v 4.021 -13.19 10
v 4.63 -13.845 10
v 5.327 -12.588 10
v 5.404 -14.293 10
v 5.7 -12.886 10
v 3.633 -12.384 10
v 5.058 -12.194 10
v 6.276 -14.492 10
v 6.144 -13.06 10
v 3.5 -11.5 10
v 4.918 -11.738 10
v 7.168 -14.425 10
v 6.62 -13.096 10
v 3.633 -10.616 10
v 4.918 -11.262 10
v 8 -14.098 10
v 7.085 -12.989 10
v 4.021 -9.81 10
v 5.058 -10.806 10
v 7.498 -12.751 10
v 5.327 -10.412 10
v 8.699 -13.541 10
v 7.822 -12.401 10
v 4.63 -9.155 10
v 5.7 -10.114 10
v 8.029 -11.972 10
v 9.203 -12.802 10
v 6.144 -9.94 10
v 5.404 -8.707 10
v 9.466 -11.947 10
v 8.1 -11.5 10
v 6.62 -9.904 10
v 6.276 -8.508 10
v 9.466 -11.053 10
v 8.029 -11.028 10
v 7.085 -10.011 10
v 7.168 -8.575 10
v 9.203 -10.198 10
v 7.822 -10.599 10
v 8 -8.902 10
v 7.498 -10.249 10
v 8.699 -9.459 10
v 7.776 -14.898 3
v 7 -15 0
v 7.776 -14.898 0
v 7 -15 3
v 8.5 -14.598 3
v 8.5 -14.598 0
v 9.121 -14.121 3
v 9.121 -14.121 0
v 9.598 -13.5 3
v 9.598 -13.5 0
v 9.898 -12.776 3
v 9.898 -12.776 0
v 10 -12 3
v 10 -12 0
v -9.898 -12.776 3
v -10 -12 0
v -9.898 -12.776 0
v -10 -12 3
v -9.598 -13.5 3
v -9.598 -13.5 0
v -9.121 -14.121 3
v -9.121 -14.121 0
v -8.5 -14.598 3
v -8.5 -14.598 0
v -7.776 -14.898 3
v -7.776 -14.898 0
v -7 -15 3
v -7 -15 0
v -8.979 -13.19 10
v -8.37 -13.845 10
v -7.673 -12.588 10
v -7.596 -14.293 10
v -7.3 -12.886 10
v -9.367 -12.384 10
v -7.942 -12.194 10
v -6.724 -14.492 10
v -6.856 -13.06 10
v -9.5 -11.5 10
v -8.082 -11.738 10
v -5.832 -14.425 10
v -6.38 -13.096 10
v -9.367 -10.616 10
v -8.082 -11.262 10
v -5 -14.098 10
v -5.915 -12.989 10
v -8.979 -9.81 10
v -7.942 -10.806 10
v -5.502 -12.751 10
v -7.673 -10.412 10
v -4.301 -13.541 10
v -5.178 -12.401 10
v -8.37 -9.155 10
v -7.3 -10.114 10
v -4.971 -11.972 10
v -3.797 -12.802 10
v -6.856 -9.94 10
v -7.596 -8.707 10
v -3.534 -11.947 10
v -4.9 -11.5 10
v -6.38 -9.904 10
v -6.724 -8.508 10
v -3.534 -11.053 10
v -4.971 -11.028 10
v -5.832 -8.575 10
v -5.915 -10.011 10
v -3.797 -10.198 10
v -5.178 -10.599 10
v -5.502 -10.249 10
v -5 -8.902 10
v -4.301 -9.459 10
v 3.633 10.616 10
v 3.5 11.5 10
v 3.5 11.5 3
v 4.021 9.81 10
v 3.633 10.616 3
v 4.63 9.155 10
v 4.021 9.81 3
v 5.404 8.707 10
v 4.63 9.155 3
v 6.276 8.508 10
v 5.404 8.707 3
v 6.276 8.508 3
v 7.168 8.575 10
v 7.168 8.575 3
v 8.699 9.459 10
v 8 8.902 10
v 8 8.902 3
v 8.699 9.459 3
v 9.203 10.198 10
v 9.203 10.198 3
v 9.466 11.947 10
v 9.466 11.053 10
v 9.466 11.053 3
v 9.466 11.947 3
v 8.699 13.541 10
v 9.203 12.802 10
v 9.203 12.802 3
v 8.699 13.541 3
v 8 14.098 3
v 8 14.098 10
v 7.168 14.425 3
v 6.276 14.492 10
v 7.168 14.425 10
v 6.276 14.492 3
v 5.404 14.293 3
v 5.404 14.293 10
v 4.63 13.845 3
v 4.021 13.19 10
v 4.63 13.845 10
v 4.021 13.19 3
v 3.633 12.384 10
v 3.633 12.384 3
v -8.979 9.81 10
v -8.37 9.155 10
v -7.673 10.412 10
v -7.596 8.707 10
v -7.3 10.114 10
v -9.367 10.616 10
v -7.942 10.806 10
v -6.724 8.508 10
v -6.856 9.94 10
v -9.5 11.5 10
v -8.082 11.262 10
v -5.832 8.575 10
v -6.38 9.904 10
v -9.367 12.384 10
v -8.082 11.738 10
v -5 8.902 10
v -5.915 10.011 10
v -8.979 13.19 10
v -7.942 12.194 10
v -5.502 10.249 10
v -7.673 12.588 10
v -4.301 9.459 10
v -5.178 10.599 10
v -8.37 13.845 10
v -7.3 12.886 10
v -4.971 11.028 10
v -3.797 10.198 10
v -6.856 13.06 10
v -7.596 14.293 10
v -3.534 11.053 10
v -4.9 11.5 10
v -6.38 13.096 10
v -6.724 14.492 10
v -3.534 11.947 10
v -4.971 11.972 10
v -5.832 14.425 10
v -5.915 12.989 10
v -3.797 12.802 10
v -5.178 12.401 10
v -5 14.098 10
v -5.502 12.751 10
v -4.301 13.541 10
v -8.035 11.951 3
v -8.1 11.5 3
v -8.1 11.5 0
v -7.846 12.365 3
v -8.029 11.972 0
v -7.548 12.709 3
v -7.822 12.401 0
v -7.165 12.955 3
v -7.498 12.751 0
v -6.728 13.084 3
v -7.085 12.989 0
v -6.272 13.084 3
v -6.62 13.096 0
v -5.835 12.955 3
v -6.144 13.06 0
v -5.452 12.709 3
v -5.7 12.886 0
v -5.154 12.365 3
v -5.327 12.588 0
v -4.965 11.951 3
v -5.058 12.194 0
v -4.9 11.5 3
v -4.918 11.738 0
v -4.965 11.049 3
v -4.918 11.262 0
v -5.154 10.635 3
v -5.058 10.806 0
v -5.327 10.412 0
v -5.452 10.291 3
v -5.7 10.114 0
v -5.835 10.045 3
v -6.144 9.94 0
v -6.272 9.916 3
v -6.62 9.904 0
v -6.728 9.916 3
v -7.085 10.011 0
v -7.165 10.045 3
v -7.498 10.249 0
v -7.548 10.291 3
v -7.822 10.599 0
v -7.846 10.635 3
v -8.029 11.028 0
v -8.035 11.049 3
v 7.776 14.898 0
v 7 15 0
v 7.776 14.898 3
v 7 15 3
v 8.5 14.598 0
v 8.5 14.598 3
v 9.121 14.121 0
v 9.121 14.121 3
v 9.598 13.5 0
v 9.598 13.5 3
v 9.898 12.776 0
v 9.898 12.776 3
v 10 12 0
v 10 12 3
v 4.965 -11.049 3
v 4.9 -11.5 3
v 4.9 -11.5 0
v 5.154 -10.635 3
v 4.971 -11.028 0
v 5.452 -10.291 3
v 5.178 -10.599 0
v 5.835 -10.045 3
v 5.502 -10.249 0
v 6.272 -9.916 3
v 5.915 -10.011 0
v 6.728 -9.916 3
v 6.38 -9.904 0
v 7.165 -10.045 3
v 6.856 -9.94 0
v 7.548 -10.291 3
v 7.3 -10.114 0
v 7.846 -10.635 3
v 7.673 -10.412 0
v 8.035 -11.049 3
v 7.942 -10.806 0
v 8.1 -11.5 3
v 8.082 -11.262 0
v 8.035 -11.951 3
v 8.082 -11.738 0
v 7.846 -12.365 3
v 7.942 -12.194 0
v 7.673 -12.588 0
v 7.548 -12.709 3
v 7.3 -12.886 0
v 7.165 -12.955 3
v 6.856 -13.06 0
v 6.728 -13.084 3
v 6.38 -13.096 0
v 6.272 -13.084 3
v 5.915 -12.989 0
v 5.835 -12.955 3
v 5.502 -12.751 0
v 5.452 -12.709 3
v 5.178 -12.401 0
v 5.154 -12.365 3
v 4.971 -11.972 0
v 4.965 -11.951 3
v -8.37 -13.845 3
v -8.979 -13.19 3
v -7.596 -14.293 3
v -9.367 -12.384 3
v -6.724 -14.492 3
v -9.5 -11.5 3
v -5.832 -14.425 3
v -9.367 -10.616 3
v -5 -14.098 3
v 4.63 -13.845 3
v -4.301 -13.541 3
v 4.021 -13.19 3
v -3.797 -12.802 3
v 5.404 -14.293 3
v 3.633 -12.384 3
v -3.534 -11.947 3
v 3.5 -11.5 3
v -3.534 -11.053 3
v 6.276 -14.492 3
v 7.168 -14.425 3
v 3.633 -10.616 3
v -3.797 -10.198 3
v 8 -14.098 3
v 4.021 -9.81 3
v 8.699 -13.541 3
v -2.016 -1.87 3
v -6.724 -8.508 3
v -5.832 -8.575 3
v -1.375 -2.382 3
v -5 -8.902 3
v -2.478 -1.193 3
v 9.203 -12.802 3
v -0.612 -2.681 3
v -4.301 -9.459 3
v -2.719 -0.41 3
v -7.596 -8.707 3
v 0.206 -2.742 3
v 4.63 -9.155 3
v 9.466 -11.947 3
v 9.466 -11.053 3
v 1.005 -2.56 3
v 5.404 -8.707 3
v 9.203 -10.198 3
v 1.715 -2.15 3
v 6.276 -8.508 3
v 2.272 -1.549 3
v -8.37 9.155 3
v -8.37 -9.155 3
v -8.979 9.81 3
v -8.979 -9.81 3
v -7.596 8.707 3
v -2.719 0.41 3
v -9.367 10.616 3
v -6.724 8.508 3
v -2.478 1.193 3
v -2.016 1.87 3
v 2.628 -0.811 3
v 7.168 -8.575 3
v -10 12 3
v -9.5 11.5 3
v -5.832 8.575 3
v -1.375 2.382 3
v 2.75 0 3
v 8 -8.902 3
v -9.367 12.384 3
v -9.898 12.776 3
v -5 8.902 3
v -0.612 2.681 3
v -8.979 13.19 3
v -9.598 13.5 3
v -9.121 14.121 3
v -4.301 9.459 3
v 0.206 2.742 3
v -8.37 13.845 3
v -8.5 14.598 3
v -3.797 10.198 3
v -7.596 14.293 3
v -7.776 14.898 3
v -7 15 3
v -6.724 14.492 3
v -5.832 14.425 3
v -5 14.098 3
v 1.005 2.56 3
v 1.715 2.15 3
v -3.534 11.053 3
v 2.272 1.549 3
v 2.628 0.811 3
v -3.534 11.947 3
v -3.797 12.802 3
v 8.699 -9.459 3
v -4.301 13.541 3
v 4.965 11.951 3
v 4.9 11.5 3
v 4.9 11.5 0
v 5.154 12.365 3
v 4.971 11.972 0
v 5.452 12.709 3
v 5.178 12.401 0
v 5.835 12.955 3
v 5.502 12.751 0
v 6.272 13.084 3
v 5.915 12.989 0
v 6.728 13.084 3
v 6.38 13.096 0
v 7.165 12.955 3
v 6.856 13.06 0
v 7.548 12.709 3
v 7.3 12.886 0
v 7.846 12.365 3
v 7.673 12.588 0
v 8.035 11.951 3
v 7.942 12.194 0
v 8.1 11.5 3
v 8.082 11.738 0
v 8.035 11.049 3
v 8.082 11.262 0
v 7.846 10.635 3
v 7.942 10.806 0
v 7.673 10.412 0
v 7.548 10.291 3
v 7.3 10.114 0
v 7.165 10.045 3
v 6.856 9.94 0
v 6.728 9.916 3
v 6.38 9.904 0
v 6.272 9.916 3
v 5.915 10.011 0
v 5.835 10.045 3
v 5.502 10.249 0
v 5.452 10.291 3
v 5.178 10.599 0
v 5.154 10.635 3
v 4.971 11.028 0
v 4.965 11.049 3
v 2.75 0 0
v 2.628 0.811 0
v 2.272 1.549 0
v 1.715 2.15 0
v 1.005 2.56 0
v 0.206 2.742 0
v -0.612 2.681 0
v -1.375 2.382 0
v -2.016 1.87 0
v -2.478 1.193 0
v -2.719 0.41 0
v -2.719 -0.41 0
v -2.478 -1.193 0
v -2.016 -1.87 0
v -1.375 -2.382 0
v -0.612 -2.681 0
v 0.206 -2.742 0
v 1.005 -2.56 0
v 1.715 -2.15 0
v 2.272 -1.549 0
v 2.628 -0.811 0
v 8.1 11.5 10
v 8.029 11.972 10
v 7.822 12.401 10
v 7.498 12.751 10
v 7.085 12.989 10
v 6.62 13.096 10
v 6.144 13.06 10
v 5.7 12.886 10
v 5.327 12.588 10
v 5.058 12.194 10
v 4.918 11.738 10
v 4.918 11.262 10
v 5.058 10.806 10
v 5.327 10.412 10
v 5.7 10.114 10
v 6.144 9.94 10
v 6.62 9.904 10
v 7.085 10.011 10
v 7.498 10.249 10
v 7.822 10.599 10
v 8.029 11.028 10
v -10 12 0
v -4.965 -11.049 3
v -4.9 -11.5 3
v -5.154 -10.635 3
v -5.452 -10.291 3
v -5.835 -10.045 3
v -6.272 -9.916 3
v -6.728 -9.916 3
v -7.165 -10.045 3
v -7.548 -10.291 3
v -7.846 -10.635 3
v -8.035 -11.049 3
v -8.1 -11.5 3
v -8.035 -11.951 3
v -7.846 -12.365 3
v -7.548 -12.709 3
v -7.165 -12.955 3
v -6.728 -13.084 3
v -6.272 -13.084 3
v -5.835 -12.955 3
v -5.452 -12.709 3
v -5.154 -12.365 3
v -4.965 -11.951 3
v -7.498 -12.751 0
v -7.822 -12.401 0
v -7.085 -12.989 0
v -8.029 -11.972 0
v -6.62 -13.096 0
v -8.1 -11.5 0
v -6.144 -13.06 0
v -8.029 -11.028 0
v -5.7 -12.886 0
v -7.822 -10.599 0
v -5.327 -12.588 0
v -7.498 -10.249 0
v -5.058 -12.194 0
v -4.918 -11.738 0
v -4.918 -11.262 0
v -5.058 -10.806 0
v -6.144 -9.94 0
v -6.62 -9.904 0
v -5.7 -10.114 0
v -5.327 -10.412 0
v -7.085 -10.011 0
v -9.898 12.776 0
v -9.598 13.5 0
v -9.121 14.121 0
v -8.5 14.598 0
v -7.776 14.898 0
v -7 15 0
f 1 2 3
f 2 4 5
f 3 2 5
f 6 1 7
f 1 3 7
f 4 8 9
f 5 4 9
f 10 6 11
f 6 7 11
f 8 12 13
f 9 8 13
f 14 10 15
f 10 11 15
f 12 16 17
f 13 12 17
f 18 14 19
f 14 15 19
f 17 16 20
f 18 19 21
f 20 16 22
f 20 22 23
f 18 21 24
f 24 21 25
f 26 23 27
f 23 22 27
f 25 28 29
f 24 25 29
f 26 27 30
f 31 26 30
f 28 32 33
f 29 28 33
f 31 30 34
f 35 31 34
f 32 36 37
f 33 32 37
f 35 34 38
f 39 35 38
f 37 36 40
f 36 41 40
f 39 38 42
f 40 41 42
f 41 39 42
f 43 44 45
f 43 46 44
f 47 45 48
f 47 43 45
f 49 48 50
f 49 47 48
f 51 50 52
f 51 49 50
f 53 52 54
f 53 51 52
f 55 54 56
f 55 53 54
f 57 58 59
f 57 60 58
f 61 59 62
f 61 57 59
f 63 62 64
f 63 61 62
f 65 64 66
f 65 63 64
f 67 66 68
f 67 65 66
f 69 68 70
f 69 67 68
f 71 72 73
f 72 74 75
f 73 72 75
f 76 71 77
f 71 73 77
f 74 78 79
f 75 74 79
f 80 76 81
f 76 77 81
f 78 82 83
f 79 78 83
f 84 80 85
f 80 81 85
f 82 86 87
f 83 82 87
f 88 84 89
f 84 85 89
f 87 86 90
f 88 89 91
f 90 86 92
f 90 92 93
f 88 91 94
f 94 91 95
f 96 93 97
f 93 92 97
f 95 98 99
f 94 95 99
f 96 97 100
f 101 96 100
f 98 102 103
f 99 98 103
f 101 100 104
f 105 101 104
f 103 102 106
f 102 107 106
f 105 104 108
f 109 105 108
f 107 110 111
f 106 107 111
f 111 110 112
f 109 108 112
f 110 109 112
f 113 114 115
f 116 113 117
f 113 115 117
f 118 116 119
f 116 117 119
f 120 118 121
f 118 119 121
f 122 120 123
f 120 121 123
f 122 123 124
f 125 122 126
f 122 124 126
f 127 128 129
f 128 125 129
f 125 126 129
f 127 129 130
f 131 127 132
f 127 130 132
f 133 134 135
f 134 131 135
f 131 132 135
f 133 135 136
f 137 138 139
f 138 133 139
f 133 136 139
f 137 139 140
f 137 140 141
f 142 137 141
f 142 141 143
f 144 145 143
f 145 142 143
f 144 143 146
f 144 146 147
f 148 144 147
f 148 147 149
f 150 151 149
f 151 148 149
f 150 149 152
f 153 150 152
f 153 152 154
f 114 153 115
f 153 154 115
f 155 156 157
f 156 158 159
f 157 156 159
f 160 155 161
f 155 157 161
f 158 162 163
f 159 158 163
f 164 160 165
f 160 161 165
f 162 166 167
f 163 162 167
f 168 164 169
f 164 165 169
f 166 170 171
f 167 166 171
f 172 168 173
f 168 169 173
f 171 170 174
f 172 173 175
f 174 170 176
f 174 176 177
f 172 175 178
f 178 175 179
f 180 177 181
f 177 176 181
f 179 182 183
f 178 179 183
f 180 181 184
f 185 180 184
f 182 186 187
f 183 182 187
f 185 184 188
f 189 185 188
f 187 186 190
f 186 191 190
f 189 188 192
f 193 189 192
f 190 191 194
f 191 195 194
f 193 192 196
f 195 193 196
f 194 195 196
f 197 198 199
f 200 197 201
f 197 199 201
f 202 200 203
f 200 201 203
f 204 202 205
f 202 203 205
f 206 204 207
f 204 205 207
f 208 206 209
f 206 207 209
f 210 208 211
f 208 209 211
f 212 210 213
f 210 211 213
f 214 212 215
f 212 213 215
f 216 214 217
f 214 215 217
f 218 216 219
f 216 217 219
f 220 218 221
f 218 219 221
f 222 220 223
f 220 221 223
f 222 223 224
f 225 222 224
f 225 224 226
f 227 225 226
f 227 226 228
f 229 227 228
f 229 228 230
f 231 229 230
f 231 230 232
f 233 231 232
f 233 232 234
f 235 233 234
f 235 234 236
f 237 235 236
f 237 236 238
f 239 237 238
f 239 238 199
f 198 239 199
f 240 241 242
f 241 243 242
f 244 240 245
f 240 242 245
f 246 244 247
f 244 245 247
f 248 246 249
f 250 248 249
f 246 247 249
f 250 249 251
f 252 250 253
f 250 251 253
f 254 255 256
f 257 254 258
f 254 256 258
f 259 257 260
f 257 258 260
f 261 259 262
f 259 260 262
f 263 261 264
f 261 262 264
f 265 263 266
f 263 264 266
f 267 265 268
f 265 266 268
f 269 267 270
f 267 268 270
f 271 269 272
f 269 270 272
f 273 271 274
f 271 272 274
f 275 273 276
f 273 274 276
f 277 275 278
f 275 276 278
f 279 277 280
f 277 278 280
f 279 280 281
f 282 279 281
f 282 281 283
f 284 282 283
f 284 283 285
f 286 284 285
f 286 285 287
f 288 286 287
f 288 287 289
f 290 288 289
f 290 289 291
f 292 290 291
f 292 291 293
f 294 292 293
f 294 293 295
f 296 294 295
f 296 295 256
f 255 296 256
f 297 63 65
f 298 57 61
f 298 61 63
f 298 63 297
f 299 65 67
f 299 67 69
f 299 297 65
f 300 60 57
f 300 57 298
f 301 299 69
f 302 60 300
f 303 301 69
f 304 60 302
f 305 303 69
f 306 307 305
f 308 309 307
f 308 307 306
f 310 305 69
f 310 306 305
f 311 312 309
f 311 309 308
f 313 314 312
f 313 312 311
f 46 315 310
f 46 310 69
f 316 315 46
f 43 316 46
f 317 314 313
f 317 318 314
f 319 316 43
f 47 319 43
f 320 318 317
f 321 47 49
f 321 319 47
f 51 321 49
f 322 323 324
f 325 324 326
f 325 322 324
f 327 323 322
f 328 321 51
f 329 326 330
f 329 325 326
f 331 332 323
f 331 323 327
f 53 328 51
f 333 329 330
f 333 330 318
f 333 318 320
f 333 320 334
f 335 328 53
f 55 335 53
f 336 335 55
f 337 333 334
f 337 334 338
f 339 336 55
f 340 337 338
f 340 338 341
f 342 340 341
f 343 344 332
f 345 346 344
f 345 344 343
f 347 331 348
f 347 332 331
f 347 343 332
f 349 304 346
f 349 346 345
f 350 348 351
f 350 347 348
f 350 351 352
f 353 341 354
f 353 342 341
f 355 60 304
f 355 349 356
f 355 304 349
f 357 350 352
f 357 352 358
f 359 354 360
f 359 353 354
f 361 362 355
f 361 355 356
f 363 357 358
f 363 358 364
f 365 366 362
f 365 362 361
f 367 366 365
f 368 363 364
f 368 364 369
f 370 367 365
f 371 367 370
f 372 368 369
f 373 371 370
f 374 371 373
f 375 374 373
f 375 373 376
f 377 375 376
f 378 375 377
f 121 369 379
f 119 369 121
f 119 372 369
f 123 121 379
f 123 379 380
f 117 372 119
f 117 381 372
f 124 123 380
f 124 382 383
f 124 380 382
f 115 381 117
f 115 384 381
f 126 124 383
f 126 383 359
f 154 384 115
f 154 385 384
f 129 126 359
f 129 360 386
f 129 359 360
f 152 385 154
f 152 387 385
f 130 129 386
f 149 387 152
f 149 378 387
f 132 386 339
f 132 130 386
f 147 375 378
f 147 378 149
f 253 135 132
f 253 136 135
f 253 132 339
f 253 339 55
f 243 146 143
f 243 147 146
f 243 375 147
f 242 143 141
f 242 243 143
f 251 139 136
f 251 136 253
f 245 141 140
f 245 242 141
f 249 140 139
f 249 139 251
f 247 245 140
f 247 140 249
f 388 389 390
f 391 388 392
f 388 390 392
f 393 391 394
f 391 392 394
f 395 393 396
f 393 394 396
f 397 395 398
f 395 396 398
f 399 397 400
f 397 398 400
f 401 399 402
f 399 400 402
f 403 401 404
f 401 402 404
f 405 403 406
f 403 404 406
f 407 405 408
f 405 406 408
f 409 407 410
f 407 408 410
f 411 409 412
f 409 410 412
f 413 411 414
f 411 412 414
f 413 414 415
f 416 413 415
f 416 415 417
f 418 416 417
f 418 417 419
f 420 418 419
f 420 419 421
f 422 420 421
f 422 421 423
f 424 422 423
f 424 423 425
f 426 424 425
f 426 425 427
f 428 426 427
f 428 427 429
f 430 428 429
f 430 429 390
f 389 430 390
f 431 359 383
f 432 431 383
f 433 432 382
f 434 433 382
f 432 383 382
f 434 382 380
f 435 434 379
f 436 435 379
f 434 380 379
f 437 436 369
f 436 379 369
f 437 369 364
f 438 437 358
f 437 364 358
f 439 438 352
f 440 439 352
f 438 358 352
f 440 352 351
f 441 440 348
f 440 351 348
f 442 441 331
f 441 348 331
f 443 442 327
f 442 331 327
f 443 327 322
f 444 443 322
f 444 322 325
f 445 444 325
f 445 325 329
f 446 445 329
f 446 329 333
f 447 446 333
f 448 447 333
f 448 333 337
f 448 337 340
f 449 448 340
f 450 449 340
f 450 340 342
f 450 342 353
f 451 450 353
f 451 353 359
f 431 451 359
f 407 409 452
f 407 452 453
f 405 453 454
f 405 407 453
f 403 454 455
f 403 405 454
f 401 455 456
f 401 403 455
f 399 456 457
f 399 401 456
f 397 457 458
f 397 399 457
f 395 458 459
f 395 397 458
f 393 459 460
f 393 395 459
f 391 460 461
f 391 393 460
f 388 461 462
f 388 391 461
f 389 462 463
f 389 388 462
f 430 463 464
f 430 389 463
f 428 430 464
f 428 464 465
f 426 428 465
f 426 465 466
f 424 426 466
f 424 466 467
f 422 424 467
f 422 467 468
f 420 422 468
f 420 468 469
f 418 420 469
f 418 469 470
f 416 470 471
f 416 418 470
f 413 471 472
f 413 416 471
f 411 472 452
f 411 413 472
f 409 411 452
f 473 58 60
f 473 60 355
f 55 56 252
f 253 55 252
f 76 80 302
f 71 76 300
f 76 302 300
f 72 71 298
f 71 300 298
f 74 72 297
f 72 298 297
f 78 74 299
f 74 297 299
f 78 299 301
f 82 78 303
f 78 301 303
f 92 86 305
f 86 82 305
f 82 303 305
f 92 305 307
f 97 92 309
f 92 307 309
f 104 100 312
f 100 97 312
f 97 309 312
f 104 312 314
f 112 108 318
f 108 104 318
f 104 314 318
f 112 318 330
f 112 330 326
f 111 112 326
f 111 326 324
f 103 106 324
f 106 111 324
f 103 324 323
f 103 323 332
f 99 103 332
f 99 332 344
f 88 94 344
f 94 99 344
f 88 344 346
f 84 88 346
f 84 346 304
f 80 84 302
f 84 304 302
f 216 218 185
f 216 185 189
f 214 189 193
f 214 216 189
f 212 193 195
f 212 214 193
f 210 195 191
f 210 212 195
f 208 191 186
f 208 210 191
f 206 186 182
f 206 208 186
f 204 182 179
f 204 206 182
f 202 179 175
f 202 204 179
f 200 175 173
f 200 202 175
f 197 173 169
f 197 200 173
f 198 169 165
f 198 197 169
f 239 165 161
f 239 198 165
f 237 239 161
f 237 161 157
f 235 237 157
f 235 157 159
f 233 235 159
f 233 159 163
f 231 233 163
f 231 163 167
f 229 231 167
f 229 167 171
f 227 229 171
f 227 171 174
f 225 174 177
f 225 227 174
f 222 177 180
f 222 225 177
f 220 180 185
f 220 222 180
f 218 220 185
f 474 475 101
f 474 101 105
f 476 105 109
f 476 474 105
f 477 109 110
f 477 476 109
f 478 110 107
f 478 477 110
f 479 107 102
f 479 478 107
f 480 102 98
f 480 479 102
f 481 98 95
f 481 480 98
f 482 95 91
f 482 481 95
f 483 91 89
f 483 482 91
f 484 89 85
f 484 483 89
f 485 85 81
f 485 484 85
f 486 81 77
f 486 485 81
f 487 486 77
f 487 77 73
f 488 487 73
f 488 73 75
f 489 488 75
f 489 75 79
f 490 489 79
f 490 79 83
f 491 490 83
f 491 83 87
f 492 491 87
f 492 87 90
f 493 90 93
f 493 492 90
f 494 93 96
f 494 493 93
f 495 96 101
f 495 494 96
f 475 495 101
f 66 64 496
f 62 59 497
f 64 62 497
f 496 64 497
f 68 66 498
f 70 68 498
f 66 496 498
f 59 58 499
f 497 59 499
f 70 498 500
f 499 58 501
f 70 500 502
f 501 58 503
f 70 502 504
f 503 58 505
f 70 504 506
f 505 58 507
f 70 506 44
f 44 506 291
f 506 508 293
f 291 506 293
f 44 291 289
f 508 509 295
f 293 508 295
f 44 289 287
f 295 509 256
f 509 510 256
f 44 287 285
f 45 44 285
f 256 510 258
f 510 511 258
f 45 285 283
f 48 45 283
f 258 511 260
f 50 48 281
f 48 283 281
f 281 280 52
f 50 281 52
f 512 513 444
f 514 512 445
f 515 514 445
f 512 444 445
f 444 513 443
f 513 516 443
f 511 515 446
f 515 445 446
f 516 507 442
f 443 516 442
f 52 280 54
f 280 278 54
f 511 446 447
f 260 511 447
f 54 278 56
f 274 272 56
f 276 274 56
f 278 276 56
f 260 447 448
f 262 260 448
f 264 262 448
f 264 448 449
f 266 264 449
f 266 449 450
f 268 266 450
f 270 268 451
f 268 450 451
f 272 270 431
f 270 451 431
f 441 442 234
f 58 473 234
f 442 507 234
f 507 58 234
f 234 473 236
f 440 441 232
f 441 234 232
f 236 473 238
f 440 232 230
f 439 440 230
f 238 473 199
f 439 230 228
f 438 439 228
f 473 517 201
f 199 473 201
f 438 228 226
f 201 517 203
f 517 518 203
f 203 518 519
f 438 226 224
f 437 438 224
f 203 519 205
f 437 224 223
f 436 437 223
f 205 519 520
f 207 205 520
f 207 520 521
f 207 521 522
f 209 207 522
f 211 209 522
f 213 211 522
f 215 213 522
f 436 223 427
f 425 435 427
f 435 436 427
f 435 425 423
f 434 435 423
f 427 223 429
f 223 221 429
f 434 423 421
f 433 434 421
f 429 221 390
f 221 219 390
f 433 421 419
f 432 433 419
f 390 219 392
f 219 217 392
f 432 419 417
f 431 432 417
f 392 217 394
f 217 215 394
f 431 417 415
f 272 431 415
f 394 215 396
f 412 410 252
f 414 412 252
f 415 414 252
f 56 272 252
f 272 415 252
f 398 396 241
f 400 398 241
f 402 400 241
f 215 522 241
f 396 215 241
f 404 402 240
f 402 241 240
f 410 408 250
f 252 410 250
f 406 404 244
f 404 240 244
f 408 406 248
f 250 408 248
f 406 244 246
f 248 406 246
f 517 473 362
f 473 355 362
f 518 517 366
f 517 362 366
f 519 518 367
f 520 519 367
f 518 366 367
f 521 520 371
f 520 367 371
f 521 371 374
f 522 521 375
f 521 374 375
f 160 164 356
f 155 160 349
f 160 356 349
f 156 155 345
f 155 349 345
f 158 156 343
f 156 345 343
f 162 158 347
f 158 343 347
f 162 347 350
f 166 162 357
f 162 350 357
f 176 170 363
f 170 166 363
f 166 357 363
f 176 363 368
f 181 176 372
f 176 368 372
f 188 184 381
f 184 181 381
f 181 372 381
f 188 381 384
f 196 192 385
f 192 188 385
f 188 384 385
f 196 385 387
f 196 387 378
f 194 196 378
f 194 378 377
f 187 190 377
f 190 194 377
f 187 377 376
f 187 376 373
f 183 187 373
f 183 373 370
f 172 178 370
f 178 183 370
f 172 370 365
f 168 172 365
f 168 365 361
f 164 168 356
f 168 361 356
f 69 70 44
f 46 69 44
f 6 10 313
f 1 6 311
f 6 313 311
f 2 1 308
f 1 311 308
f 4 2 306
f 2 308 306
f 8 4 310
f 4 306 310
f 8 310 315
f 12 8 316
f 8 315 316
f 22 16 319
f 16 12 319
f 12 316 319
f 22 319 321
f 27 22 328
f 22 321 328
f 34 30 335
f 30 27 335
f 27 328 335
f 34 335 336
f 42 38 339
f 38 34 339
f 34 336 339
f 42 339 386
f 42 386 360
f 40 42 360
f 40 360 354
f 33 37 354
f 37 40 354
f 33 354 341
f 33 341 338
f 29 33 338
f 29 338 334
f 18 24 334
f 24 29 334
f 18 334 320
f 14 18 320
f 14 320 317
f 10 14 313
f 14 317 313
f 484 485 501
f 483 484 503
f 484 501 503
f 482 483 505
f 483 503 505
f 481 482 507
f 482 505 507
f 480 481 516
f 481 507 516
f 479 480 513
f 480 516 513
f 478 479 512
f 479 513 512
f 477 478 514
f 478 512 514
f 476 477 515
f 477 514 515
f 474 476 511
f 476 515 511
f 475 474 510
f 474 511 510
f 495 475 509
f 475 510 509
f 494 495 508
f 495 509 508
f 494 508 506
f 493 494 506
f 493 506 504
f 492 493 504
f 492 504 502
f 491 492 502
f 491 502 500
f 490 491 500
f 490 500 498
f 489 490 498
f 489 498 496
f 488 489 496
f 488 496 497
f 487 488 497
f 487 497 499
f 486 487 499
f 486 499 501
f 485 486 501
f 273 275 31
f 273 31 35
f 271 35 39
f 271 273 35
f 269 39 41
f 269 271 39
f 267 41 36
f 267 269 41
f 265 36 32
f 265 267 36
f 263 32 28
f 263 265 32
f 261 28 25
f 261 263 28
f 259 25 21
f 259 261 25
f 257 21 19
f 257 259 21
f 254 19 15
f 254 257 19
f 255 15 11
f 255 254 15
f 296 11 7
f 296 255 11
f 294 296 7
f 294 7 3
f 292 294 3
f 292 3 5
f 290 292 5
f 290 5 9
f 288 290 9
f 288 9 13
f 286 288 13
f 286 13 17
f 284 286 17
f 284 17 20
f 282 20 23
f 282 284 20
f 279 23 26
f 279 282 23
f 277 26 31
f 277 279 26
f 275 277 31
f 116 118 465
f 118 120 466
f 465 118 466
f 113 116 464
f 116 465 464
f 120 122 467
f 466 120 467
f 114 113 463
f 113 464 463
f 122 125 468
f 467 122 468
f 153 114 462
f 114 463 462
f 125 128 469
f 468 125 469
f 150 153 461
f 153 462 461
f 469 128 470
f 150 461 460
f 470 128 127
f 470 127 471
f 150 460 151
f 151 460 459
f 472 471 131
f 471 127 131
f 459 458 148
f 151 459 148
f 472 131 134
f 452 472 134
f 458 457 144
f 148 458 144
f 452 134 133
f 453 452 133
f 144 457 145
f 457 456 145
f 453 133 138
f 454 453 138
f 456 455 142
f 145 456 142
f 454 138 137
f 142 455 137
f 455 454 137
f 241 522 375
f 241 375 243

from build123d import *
from build123d.topology import SkipClean

# Parameters (mm, degrees)
SKETCH1_W                  = 20
SKETCH1_H                  = 30
BOSS_EXTRUDE1_DEPTH        = 3
F_3_2_3_2_DIAMETER_HOLE1_D = 3.2
SKETCH5_R                  = 3
SKETCH5_R_2                = 1.6
BOSS_EXTRUDE2_DEPTH        = 20
SKETCH6_R                  = 2.75
CUT_EXTRUDE1_DEPTH         = 27.925824036
SKETCH7_W                  = 20
SKETCH7_H                  = 40
CUT_EXTRUDE2_DEPTH         = 34.970575503
FILLET1_R                  = 3


with BuildPart() as part:
    # Sketch1 → Boss-Extrude1 (new body)
    with BuildSketch(Plane.XY):
        Rectangle(SKETCH1_W, SKETCH1_H)
    extrude(amount=BOSS_EXTRUDE1_DEPTH)

    # Ø3.2 (3.2) Diameter Hole1 (through all)
    with Locations(Plane.XY.offset(3)):
        with Locations((-6.5, 11.5), (6.5, 11.5), (6.5, -11.5), (-6.5, -11.5)):
            Hole(F_3_2_3_2_DIAMETER_HOLE1_D / 2)

    # Sketch5 → Boss-Extrude2 (add)
    # profile 1 of 4: a face of its own
    with SkipClean():  # the faces are left unmerged after this step: merging them gives an invalid solid
        with BuildSketch(Plane.XY.offset(3)):
            with Locations((-6.5, 11.5)):
                Circle(SKETCH5_R)
            with Locations((-6.5, 11.5)):
                Circle(SKETCH5_R_2, mode=Mode.SUBTRACT)
        # profile 2 of 4: a face of its own
        with BuildSketch(Plane.XY.offset(3)):
            with Locations((6.5, 11.5)):
                Circle(SKETCH5_R)
            with Locations((6.5, 11.5)):
                Circle(SKETCH5_R_2, mode=Mode.SUBTRACT)
        # profile 3 of 4: a face of its own
        with BuildSketch(Plane.XY.offset(3)):
            with Locations((6.5, -11.5)):
                Circle(SKETCH5_R)
            with Locations((6.5, -11.5)):
                Circle(SKETCH5_R_2, mode=Mode.SUBTRACT)
        # profile 4 of 4: a face of its own
        with BuildSketch(Plane.XY.offset(3)):
            with Locations((-6.5, -11.5)):
                Circle(SKETCH5_R)
            with Locations((-6.5, -11.5)):
                Circle(SKETCH5_R_2, mode=Mode.SUBTRACT)
        extrude(amount=BOSS_EXTRUDE2_DEPTH)
    add(part.part.scale(1), mode=Mode.REPLACE)  # the faces are merged on a copy

    # Sketch6 → Cut-Extrude1 (cut, through all)
    with BuildSketch(Plane.XY.offset(3)):
        Circle(SKETCH6_R)
    extrude(amount=-CUT_EXTRUDE1_DEPTH, mode=Mode.SUBTRACT)

    # Sketch7 → Cut-Extrude2 (cut, through all)
    with BuildSketch(Plane(origin=(10, 0, 0), x_dir=(0, 0, -1), z_dir=(1, 0, 0))):
        with Locations((-20, 0)):
            Rectangle(SKETCH7_W, SKETCH7_H)
    extrude(amount=-CUT_EXTRUDE2_DEPTH, mode=Mode.SUBTRACT)

    # Fillet1
    fillet1_edges = [part.edges().sort_by_distance(p)[0] for p in [
        (10, -15, 1.5),
        (-10, -15, 1.5),
        (-10, 15, 1.5),
        (10, 15, 1.5),
    ]]
    fillet(fillet1_edges, radius=FILLET1_R)


solid = part.part
